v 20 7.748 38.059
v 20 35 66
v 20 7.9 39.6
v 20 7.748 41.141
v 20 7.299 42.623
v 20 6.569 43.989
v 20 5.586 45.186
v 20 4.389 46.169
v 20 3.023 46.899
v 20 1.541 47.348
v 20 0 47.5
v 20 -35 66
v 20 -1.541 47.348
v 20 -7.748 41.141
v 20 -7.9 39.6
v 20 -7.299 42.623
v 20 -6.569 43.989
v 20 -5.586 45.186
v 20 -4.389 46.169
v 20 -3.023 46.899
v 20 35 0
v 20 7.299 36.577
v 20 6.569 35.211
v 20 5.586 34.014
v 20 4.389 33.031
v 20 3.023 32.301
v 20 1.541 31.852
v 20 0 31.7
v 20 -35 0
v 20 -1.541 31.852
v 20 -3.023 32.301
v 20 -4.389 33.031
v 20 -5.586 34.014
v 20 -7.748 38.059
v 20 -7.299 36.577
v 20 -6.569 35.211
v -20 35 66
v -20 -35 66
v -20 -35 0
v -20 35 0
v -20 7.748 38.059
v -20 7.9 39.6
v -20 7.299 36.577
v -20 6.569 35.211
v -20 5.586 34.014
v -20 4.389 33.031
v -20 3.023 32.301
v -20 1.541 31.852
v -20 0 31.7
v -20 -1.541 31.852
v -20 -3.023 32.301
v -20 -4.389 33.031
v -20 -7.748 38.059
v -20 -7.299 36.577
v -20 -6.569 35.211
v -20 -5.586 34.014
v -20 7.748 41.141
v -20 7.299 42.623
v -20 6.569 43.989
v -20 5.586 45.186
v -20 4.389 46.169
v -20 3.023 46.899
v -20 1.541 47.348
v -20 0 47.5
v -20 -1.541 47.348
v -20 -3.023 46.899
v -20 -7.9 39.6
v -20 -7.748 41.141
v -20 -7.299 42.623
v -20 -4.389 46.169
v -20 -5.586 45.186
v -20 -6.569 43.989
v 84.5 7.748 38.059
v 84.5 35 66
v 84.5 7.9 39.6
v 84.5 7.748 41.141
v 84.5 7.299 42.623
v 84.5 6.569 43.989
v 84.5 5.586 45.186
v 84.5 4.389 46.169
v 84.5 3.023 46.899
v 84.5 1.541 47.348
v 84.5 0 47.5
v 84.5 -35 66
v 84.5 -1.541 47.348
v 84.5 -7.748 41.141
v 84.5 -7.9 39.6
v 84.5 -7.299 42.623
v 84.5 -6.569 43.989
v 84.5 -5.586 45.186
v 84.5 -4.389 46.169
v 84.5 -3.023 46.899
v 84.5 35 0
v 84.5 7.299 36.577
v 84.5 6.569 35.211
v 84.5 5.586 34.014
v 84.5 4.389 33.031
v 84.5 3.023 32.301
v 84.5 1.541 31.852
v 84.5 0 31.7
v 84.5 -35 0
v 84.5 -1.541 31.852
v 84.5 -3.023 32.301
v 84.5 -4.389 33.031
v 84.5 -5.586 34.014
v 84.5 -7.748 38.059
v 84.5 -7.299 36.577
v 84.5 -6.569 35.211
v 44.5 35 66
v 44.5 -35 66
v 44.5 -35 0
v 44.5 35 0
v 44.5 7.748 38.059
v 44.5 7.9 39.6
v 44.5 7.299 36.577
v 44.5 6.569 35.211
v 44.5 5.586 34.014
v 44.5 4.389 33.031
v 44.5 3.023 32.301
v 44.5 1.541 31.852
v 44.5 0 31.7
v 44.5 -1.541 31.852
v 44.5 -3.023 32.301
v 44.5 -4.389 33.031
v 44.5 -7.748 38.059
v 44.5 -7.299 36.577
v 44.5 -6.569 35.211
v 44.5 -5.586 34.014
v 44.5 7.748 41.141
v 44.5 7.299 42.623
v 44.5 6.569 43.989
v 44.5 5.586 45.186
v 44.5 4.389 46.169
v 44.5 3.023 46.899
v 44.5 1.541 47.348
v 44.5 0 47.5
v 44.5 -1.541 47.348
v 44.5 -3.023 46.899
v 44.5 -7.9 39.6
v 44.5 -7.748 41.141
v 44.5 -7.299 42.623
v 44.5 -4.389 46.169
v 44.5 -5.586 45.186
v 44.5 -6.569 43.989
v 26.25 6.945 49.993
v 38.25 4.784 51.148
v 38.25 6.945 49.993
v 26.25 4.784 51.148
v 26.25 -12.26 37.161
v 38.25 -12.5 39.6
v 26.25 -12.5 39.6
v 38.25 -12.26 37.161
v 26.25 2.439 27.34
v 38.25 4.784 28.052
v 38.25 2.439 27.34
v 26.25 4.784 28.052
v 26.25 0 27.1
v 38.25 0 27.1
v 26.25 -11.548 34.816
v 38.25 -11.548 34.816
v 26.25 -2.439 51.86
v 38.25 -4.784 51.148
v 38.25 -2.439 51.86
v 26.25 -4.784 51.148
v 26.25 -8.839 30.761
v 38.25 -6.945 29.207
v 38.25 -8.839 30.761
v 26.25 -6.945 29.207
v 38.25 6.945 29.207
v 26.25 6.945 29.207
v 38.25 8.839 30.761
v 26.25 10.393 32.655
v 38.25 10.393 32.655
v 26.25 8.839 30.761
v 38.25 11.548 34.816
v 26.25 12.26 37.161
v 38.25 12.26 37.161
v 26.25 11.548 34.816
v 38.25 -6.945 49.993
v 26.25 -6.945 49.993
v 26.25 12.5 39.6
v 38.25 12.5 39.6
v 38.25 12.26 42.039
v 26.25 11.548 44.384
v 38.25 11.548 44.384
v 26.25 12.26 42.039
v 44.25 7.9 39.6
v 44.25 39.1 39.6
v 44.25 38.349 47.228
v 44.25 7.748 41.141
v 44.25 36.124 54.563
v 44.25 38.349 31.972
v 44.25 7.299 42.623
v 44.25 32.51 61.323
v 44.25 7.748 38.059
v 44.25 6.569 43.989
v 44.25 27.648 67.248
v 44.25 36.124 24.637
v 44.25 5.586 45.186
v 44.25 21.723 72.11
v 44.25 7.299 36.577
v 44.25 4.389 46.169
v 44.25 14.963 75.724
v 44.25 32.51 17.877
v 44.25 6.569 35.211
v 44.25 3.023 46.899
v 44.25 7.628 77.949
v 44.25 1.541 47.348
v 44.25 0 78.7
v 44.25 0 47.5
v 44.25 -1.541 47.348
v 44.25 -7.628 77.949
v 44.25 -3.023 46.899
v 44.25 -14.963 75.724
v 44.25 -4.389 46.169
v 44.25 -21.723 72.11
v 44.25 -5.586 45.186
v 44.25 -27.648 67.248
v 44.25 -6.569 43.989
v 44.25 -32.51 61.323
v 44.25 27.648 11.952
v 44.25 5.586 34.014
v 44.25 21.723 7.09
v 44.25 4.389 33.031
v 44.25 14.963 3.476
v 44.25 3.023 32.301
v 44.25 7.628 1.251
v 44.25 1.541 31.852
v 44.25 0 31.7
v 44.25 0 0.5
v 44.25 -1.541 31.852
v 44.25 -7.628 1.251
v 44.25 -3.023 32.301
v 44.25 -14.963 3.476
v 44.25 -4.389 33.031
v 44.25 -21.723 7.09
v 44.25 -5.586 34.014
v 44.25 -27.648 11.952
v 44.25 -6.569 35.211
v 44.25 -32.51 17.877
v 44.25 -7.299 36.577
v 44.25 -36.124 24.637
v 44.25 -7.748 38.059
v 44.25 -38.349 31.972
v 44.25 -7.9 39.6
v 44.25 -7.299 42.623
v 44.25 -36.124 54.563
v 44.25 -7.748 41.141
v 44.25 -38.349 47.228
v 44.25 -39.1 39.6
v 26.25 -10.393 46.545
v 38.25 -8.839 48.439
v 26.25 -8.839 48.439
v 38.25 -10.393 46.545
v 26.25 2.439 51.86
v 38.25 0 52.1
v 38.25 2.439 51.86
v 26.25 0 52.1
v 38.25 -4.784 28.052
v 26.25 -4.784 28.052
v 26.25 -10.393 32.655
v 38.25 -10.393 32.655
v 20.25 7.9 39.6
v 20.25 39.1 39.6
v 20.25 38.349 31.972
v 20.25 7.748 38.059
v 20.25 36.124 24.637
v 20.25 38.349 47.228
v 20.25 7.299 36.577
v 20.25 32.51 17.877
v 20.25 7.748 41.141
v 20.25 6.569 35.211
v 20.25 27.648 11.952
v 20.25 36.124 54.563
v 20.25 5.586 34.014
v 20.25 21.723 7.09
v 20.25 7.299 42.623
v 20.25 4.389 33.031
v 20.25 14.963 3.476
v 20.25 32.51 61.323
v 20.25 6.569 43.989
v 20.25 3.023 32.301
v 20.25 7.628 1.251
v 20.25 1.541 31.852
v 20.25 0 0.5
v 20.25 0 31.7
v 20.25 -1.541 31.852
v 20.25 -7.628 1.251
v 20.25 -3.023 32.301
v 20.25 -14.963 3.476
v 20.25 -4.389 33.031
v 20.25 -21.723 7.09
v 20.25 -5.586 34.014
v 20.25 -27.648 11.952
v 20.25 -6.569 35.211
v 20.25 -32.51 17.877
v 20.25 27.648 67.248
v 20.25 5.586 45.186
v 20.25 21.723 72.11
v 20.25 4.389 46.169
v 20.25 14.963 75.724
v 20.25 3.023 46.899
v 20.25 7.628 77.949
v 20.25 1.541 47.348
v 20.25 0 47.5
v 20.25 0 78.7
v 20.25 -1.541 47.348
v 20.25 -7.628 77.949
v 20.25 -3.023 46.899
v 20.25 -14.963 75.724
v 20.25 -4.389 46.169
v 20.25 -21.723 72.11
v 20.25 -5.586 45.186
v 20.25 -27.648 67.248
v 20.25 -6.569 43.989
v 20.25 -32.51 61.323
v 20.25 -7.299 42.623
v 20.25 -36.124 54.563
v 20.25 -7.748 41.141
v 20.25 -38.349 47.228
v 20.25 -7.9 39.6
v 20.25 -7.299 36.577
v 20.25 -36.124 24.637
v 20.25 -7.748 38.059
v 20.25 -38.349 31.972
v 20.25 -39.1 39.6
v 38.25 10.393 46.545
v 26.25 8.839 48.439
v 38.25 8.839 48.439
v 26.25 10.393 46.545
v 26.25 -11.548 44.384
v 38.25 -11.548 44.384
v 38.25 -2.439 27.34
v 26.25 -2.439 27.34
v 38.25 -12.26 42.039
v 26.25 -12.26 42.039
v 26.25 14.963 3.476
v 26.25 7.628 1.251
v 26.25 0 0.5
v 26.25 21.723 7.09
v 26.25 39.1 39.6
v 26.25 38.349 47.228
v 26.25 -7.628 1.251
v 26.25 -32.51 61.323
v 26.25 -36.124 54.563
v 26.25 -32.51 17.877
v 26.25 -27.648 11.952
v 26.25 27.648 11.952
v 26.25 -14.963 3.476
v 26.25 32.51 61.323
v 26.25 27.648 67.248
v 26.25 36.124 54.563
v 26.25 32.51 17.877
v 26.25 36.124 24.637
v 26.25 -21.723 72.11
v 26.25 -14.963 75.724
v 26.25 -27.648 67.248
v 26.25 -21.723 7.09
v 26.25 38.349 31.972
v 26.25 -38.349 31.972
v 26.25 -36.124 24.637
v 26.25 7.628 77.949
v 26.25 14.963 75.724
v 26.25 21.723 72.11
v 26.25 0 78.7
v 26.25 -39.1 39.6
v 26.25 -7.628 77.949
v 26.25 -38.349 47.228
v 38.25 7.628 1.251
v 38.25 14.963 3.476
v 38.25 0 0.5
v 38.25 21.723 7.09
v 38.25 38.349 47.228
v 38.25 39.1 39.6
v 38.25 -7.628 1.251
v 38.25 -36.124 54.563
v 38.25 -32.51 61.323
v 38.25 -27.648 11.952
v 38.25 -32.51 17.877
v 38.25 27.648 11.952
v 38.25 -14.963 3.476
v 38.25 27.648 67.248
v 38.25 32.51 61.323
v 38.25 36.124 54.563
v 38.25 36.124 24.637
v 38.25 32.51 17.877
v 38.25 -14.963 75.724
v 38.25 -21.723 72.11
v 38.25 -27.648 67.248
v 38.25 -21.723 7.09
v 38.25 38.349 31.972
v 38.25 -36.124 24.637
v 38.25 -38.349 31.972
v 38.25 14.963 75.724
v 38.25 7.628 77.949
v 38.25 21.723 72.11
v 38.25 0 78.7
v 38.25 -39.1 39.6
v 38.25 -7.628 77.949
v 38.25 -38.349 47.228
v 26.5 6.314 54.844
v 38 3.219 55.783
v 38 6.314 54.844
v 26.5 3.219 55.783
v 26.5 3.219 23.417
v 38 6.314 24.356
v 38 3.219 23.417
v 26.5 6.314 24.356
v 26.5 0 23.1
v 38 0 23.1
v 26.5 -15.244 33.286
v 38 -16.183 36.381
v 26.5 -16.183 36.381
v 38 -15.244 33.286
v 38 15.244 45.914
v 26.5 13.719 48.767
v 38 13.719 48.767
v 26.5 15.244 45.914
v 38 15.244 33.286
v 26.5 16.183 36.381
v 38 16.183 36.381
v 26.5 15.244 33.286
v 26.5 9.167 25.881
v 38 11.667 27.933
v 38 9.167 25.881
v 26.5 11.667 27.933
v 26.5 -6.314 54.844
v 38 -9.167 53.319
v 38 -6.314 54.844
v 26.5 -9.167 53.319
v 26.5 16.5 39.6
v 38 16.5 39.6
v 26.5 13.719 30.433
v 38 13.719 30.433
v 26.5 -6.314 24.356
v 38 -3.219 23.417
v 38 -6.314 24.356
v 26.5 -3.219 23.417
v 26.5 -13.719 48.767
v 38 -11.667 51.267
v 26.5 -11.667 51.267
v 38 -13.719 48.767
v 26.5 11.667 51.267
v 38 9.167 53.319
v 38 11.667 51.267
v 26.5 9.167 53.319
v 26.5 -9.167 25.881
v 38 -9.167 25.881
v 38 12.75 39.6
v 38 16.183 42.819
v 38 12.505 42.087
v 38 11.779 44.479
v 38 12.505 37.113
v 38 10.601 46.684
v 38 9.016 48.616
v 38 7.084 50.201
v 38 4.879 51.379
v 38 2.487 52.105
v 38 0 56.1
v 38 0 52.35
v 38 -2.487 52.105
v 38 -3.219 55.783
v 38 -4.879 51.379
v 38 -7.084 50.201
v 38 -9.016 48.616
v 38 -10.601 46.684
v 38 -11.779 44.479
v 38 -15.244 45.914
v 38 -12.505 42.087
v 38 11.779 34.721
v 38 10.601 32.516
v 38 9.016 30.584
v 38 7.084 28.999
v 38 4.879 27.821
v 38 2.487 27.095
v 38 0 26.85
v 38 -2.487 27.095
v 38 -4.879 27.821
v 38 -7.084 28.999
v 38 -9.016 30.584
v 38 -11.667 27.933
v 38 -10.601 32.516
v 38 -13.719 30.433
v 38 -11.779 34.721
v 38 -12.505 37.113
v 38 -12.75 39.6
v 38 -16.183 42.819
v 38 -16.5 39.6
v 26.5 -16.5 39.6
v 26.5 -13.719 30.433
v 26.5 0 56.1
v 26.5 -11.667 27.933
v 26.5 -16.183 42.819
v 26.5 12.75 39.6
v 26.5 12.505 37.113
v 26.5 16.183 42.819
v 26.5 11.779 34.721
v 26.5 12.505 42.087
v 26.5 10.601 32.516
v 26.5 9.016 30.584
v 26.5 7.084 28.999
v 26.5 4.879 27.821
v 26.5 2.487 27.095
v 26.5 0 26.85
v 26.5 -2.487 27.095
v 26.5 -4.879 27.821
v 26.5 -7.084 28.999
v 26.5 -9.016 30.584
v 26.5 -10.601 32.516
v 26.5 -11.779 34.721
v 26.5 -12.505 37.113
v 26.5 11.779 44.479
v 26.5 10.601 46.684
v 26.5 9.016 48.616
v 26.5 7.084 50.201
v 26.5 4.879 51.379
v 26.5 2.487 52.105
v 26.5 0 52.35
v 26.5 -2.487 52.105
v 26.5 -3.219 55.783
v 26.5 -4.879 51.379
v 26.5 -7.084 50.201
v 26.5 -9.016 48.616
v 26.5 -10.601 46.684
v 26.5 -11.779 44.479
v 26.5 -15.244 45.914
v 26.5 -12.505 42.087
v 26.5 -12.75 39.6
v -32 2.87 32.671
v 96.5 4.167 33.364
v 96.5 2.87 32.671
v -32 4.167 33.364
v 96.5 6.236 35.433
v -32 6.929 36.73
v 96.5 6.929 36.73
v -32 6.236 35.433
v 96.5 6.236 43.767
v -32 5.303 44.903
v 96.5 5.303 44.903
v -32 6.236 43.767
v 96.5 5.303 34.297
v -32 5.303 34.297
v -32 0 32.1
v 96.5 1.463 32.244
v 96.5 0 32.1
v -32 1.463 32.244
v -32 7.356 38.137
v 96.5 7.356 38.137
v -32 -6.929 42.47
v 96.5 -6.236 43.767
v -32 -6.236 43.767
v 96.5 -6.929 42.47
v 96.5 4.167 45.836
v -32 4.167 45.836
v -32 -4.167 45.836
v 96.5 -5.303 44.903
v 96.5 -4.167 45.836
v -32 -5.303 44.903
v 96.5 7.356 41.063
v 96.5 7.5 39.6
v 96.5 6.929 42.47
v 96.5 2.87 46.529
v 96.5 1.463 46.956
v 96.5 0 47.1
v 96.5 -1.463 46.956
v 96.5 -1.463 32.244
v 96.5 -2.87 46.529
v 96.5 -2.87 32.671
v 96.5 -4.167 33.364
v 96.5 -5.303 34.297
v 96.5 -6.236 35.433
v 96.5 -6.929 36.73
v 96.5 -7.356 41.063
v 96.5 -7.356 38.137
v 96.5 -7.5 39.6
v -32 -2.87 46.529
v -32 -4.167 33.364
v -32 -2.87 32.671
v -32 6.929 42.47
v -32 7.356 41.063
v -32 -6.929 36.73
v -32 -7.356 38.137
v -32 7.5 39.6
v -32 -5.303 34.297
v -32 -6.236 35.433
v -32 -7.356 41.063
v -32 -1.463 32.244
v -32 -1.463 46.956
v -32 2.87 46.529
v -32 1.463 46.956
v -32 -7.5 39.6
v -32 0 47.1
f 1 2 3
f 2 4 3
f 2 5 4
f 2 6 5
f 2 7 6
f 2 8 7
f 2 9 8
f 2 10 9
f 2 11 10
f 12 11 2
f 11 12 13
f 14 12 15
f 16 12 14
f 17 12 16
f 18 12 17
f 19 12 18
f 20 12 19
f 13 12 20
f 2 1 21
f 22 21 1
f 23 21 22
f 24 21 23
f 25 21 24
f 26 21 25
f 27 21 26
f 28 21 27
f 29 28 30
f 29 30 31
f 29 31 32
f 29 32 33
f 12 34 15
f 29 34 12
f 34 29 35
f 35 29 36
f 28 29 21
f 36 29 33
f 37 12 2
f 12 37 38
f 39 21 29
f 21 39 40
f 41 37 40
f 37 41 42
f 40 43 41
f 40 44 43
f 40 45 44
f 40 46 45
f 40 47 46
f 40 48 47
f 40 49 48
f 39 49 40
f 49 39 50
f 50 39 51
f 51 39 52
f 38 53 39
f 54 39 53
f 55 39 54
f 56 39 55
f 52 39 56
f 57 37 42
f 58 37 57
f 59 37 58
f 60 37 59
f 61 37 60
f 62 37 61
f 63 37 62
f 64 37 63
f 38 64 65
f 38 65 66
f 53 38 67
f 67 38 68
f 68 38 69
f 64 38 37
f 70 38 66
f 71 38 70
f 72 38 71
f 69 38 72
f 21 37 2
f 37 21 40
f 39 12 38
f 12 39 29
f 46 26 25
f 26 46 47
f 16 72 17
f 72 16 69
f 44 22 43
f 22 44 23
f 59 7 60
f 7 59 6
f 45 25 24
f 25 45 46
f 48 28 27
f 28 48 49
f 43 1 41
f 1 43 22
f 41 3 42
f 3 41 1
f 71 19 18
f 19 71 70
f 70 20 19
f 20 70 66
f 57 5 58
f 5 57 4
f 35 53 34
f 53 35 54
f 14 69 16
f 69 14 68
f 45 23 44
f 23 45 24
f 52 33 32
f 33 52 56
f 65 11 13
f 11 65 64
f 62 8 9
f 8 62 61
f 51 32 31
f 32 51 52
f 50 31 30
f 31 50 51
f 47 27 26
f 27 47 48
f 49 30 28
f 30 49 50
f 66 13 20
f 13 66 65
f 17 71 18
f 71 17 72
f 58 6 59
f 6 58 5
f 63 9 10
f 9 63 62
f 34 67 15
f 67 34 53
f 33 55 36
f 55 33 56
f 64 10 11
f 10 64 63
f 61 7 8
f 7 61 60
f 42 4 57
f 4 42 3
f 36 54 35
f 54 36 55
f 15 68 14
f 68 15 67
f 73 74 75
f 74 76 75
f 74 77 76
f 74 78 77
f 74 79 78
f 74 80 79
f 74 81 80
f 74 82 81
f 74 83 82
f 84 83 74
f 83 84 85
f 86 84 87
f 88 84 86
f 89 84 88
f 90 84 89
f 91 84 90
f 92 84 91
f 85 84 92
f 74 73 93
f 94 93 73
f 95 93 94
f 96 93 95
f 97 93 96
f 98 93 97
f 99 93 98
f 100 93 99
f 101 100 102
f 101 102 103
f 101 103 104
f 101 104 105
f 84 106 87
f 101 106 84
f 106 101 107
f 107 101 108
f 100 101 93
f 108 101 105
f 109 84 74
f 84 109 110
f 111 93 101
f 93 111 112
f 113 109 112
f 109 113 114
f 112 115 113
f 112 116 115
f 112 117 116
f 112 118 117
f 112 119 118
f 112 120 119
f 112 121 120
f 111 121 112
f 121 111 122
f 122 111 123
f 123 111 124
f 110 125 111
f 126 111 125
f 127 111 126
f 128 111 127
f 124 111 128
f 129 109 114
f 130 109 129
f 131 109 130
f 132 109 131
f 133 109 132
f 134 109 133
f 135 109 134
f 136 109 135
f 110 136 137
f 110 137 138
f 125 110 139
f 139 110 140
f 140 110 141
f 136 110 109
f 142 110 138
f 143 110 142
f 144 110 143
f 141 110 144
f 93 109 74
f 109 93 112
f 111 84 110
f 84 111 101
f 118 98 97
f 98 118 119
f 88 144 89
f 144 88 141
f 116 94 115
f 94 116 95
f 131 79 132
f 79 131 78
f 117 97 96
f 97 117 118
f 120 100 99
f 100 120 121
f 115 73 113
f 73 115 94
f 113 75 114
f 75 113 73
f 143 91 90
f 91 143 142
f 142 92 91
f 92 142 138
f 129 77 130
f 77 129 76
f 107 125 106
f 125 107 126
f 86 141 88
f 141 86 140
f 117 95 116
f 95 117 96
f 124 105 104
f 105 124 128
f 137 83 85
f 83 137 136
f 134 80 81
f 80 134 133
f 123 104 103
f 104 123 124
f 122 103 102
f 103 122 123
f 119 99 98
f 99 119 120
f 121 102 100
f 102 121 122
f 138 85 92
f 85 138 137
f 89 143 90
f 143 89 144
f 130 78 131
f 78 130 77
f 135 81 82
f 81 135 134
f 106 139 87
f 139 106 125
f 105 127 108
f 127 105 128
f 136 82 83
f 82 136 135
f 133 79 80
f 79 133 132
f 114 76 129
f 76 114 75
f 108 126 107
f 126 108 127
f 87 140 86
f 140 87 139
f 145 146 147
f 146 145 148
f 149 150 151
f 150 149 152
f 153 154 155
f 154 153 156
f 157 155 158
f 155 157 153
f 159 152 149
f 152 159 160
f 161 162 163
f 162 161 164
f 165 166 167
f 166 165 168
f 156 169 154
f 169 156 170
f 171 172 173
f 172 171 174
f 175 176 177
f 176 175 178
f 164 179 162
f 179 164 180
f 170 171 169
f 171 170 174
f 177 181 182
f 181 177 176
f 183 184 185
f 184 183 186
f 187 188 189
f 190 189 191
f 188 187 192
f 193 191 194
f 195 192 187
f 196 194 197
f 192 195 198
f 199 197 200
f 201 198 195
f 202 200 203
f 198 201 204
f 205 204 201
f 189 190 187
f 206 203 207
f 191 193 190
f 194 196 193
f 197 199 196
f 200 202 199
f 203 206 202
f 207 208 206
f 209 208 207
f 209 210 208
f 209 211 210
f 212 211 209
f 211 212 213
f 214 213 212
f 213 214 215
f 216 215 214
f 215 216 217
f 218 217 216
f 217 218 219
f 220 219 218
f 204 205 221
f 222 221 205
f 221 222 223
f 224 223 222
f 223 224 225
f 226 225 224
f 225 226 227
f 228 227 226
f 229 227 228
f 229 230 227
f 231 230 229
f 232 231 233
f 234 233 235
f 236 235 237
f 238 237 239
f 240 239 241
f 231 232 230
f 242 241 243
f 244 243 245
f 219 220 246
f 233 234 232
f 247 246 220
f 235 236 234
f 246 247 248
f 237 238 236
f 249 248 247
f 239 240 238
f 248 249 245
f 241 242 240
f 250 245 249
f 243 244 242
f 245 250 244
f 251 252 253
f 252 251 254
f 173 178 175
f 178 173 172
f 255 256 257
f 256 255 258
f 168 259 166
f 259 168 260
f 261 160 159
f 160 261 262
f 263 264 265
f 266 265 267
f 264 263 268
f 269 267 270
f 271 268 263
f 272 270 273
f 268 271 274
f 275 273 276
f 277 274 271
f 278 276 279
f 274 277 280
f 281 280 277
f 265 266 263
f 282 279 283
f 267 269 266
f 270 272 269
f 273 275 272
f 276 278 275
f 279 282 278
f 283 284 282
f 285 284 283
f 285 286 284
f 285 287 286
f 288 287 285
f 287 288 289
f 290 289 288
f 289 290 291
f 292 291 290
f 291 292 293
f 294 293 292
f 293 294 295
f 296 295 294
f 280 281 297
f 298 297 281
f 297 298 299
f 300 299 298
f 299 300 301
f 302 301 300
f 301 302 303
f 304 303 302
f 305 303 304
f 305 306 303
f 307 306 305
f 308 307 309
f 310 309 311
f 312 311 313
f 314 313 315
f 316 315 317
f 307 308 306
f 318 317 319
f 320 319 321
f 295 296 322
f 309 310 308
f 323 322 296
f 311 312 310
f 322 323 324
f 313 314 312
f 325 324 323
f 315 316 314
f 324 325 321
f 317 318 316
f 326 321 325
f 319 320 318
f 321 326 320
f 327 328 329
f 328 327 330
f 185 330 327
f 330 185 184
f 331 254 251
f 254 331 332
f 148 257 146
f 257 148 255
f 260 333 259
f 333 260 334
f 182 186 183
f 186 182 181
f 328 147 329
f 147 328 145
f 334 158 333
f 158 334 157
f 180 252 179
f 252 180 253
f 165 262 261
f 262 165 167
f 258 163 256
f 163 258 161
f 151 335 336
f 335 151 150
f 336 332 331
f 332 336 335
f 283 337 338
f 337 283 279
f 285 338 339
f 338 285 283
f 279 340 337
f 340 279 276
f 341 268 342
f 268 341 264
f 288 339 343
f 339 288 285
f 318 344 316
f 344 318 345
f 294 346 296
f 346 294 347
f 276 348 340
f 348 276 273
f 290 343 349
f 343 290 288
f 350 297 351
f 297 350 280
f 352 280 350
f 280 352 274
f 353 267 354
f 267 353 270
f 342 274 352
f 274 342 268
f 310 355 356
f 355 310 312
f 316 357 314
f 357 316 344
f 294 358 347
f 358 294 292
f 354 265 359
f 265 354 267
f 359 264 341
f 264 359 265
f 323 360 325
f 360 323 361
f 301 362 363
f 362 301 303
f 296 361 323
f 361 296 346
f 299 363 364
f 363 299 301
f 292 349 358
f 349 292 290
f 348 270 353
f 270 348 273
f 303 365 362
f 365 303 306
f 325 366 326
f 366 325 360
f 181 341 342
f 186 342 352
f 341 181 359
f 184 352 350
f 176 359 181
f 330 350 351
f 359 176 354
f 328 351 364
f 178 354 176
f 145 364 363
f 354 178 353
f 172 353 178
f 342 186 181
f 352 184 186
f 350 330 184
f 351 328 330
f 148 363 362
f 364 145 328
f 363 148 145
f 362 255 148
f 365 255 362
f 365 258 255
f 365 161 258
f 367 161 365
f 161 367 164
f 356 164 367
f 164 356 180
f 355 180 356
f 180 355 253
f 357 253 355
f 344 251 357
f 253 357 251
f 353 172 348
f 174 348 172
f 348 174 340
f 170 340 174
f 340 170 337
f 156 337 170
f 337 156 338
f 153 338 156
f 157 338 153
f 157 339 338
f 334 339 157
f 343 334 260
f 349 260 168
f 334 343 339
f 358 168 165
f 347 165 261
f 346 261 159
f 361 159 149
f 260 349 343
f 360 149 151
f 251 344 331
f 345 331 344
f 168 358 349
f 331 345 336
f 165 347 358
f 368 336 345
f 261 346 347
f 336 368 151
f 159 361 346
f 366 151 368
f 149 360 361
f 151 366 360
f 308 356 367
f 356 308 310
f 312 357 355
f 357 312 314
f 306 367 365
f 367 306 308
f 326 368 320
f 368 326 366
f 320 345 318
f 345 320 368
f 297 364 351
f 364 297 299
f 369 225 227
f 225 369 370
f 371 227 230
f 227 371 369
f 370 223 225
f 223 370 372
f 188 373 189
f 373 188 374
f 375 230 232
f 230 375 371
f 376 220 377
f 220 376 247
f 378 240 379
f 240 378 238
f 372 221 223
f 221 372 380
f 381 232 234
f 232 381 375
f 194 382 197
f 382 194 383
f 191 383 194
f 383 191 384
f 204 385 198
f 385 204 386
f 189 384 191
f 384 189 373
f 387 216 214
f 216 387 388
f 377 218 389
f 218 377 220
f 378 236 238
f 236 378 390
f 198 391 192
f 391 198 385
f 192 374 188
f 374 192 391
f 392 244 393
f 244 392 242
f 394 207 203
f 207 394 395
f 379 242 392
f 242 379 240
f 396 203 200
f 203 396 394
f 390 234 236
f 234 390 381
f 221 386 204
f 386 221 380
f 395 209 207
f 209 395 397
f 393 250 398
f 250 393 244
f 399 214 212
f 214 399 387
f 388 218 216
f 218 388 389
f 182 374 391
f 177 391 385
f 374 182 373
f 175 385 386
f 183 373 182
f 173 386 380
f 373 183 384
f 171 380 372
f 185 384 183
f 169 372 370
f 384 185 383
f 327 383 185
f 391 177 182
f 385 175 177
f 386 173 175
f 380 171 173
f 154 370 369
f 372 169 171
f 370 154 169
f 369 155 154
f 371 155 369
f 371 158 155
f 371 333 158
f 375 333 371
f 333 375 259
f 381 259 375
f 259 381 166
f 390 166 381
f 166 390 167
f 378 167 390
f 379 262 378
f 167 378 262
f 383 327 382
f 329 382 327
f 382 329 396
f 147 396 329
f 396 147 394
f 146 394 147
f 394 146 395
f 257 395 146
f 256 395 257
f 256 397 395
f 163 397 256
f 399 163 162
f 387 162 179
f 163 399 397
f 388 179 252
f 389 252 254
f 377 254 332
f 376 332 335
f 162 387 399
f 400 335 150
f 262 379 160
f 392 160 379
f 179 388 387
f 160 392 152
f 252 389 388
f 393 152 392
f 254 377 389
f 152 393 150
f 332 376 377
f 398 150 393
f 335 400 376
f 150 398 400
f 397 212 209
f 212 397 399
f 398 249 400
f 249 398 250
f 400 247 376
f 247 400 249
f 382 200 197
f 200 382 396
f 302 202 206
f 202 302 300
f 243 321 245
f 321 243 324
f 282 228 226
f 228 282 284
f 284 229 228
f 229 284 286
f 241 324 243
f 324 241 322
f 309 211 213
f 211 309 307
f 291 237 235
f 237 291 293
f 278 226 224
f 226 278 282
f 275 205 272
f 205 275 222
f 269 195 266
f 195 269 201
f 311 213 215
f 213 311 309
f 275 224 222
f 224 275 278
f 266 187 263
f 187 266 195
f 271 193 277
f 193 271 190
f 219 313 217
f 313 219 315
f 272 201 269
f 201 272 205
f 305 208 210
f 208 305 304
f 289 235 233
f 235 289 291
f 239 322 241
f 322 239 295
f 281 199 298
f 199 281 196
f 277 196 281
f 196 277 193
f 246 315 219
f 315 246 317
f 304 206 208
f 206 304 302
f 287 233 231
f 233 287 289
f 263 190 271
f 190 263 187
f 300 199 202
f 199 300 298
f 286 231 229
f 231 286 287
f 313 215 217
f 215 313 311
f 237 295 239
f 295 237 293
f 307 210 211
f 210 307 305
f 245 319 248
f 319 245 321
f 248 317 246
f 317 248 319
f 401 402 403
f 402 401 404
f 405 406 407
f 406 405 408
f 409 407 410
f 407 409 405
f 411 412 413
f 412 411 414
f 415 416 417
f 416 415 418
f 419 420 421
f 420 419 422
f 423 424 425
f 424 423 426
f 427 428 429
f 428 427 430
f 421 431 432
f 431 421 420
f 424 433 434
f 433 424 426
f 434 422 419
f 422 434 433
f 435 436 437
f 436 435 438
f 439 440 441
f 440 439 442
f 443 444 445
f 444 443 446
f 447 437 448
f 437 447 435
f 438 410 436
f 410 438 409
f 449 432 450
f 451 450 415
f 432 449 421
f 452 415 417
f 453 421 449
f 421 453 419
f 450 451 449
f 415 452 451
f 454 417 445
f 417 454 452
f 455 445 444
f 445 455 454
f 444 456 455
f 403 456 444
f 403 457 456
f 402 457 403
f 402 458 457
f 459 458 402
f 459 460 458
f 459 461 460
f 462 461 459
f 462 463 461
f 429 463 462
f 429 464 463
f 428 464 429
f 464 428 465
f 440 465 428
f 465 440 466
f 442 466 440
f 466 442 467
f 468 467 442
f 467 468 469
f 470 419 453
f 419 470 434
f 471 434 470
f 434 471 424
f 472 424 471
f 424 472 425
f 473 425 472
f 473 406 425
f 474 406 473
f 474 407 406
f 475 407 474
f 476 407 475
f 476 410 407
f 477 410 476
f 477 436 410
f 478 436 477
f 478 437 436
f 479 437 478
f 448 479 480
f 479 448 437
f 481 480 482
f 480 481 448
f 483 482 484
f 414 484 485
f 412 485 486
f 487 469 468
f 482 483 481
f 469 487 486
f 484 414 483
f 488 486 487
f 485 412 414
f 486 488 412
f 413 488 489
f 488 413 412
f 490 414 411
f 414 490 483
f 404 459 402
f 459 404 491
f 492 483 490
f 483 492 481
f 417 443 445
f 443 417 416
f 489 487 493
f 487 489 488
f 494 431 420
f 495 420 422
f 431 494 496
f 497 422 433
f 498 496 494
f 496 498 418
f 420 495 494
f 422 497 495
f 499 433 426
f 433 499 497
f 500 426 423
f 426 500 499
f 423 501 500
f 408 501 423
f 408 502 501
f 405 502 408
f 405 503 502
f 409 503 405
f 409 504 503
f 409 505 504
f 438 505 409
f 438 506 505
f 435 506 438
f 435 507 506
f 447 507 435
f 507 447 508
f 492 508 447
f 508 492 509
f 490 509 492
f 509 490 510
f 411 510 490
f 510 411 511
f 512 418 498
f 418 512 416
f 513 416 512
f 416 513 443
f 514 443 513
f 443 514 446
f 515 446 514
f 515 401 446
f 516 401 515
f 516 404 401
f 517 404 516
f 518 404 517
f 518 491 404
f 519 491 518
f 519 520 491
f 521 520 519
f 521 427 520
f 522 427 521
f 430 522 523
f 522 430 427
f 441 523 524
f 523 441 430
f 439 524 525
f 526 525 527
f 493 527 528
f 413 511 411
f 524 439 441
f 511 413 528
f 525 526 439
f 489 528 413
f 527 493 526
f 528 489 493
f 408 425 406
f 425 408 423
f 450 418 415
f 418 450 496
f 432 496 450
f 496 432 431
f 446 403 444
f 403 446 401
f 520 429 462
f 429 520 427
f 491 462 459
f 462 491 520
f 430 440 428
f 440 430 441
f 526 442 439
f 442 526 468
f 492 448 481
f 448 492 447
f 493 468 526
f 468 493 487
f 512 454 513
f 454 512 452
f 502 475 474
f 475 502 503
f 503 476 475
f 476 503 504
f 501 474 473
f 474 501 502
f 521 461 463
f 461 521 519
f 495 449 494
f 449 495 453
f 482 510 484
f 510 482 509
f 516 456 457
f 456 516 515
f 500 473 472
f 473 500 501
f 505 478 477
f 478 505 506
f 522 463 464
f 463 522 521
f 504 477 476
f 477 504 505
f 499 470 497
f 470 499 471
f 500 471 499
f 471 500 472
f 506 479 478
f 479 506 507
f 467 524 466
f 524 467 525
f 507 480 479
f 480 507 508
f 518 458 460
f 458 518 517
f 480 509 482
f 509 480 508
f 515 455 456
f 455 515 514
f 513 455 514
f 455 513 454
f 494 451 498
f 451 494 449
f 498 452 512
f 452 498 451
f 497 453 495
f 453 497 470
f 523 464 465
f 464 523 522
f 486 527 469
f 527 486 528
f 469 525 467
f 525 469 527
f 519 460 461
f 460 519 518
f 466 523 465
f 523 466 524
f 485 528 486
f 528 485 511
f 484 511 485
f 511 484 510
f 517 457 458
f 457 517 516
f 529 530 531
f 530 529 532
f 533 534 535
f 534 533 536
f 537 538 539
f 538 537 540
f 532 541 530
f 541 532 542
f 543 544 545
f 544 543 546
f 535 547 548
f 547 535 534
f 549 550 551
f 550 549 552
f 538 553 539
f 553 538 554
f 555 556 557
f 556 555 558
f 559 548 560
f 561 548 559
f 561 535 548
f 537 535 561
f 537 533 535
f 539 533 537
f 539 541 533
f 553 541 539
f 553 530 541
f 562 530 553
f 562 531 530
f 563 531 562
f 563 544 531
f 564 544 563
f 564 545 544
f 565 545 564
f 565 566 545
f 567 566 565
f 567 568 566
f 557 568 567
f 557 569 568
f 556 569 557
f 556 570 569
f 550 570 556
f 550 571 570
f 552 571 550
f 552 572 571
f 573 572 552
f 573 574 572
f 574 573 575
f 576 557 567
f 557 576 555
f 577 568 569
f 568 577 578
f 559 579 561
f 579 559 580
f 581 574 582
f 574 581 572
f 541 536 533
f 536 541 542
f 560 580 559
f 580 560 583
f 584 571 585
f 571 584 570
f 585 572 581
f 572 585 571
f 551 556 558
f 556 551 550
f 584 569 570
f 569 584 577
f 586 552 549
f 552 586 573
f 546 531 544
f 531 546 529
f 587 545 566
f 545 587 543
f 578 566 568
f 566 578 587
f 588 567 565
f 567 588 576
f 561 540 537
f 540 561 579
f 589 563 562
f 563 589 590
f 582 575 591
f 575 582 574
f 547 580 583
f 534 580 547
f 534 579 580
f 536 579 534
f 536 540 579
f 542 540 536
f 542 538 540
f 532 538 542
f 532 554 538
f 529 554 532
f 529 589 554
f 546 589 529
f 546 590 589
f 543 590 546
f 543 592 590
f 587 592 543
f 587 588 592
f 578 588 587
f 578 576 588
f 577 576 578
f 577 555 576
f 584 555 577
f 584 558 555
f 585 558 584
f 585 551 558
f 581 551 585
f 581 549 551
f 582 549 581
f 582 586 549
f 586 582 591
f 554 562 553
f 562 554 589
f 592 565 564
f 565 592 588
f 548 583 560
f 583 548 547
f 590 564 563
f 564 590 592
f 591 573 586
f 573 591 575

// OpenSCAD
$fn = 32;

// ------------------------------------------------------------------------
// Pulley assembly: d78.2 pulley with a belt, shaft d15
// Every part is its own module, assembly() places them once.
// ------------------------------------------------------------------------

// --- part 1 ---
module support1() {
  difference() {
    translate([-20, -35, 0]) cube([40, 70, 66]);
    translate([0, 0, 39.6]) rotate([0, 90, 0]) cylinder(h = 42, d = 15.8, center = true);
  }
}

// --- part 2 ---
module support2() {
  difference() {
    translate([-20, -35, 0]) cube([40, 70, 66]);
    translate([0, 0, 39.6]) rotate([0, 90, 0]) cylinder(h = 42, d = 15.8, center = true);
  }
}

// --- part 3 ---
module shaft() {
  translate([0, 0, -64.25]) cylinder(h = 128.5, d = 15);
}

// --- part 4 ---
module pulley() {
  difference() {
    union() {
      cylinder(h = 24, d = 25);
      cylinder(h = 6, d = 78.2);
      translate([0, 0, 18]) cylinder(h = 6, d = 78.2);
    }
    translate([0, 0, -1]) cylinder(h = 26, d = 15.8);
  }
}

// --- part 5 ---
module belt() {
  difference() {
      translate([0, 0, 0]) cylinder(h = 11.5, d = 33);
      translate([0, 0, -1]) cylinder(h = 13.5, d = 25.5);
    }
}

// --- assembly ---
module assembly() {
  translate([0, 0, 0]) rotate([0, 0, 0]) support1();
  translate([64.5, 0, 0]) rotate([0, 0, 0]) support2();
  translate([32.25, 0, 39.6]) rotate([0, 90, 0]) shaft();
  translate([20.25, 0, 39.6]) rotate([0, 90, 0]) pulley();
  translate([26.5, 0, 39.6]) rotate([0, 90, 0]) belt();
}

assembly();
